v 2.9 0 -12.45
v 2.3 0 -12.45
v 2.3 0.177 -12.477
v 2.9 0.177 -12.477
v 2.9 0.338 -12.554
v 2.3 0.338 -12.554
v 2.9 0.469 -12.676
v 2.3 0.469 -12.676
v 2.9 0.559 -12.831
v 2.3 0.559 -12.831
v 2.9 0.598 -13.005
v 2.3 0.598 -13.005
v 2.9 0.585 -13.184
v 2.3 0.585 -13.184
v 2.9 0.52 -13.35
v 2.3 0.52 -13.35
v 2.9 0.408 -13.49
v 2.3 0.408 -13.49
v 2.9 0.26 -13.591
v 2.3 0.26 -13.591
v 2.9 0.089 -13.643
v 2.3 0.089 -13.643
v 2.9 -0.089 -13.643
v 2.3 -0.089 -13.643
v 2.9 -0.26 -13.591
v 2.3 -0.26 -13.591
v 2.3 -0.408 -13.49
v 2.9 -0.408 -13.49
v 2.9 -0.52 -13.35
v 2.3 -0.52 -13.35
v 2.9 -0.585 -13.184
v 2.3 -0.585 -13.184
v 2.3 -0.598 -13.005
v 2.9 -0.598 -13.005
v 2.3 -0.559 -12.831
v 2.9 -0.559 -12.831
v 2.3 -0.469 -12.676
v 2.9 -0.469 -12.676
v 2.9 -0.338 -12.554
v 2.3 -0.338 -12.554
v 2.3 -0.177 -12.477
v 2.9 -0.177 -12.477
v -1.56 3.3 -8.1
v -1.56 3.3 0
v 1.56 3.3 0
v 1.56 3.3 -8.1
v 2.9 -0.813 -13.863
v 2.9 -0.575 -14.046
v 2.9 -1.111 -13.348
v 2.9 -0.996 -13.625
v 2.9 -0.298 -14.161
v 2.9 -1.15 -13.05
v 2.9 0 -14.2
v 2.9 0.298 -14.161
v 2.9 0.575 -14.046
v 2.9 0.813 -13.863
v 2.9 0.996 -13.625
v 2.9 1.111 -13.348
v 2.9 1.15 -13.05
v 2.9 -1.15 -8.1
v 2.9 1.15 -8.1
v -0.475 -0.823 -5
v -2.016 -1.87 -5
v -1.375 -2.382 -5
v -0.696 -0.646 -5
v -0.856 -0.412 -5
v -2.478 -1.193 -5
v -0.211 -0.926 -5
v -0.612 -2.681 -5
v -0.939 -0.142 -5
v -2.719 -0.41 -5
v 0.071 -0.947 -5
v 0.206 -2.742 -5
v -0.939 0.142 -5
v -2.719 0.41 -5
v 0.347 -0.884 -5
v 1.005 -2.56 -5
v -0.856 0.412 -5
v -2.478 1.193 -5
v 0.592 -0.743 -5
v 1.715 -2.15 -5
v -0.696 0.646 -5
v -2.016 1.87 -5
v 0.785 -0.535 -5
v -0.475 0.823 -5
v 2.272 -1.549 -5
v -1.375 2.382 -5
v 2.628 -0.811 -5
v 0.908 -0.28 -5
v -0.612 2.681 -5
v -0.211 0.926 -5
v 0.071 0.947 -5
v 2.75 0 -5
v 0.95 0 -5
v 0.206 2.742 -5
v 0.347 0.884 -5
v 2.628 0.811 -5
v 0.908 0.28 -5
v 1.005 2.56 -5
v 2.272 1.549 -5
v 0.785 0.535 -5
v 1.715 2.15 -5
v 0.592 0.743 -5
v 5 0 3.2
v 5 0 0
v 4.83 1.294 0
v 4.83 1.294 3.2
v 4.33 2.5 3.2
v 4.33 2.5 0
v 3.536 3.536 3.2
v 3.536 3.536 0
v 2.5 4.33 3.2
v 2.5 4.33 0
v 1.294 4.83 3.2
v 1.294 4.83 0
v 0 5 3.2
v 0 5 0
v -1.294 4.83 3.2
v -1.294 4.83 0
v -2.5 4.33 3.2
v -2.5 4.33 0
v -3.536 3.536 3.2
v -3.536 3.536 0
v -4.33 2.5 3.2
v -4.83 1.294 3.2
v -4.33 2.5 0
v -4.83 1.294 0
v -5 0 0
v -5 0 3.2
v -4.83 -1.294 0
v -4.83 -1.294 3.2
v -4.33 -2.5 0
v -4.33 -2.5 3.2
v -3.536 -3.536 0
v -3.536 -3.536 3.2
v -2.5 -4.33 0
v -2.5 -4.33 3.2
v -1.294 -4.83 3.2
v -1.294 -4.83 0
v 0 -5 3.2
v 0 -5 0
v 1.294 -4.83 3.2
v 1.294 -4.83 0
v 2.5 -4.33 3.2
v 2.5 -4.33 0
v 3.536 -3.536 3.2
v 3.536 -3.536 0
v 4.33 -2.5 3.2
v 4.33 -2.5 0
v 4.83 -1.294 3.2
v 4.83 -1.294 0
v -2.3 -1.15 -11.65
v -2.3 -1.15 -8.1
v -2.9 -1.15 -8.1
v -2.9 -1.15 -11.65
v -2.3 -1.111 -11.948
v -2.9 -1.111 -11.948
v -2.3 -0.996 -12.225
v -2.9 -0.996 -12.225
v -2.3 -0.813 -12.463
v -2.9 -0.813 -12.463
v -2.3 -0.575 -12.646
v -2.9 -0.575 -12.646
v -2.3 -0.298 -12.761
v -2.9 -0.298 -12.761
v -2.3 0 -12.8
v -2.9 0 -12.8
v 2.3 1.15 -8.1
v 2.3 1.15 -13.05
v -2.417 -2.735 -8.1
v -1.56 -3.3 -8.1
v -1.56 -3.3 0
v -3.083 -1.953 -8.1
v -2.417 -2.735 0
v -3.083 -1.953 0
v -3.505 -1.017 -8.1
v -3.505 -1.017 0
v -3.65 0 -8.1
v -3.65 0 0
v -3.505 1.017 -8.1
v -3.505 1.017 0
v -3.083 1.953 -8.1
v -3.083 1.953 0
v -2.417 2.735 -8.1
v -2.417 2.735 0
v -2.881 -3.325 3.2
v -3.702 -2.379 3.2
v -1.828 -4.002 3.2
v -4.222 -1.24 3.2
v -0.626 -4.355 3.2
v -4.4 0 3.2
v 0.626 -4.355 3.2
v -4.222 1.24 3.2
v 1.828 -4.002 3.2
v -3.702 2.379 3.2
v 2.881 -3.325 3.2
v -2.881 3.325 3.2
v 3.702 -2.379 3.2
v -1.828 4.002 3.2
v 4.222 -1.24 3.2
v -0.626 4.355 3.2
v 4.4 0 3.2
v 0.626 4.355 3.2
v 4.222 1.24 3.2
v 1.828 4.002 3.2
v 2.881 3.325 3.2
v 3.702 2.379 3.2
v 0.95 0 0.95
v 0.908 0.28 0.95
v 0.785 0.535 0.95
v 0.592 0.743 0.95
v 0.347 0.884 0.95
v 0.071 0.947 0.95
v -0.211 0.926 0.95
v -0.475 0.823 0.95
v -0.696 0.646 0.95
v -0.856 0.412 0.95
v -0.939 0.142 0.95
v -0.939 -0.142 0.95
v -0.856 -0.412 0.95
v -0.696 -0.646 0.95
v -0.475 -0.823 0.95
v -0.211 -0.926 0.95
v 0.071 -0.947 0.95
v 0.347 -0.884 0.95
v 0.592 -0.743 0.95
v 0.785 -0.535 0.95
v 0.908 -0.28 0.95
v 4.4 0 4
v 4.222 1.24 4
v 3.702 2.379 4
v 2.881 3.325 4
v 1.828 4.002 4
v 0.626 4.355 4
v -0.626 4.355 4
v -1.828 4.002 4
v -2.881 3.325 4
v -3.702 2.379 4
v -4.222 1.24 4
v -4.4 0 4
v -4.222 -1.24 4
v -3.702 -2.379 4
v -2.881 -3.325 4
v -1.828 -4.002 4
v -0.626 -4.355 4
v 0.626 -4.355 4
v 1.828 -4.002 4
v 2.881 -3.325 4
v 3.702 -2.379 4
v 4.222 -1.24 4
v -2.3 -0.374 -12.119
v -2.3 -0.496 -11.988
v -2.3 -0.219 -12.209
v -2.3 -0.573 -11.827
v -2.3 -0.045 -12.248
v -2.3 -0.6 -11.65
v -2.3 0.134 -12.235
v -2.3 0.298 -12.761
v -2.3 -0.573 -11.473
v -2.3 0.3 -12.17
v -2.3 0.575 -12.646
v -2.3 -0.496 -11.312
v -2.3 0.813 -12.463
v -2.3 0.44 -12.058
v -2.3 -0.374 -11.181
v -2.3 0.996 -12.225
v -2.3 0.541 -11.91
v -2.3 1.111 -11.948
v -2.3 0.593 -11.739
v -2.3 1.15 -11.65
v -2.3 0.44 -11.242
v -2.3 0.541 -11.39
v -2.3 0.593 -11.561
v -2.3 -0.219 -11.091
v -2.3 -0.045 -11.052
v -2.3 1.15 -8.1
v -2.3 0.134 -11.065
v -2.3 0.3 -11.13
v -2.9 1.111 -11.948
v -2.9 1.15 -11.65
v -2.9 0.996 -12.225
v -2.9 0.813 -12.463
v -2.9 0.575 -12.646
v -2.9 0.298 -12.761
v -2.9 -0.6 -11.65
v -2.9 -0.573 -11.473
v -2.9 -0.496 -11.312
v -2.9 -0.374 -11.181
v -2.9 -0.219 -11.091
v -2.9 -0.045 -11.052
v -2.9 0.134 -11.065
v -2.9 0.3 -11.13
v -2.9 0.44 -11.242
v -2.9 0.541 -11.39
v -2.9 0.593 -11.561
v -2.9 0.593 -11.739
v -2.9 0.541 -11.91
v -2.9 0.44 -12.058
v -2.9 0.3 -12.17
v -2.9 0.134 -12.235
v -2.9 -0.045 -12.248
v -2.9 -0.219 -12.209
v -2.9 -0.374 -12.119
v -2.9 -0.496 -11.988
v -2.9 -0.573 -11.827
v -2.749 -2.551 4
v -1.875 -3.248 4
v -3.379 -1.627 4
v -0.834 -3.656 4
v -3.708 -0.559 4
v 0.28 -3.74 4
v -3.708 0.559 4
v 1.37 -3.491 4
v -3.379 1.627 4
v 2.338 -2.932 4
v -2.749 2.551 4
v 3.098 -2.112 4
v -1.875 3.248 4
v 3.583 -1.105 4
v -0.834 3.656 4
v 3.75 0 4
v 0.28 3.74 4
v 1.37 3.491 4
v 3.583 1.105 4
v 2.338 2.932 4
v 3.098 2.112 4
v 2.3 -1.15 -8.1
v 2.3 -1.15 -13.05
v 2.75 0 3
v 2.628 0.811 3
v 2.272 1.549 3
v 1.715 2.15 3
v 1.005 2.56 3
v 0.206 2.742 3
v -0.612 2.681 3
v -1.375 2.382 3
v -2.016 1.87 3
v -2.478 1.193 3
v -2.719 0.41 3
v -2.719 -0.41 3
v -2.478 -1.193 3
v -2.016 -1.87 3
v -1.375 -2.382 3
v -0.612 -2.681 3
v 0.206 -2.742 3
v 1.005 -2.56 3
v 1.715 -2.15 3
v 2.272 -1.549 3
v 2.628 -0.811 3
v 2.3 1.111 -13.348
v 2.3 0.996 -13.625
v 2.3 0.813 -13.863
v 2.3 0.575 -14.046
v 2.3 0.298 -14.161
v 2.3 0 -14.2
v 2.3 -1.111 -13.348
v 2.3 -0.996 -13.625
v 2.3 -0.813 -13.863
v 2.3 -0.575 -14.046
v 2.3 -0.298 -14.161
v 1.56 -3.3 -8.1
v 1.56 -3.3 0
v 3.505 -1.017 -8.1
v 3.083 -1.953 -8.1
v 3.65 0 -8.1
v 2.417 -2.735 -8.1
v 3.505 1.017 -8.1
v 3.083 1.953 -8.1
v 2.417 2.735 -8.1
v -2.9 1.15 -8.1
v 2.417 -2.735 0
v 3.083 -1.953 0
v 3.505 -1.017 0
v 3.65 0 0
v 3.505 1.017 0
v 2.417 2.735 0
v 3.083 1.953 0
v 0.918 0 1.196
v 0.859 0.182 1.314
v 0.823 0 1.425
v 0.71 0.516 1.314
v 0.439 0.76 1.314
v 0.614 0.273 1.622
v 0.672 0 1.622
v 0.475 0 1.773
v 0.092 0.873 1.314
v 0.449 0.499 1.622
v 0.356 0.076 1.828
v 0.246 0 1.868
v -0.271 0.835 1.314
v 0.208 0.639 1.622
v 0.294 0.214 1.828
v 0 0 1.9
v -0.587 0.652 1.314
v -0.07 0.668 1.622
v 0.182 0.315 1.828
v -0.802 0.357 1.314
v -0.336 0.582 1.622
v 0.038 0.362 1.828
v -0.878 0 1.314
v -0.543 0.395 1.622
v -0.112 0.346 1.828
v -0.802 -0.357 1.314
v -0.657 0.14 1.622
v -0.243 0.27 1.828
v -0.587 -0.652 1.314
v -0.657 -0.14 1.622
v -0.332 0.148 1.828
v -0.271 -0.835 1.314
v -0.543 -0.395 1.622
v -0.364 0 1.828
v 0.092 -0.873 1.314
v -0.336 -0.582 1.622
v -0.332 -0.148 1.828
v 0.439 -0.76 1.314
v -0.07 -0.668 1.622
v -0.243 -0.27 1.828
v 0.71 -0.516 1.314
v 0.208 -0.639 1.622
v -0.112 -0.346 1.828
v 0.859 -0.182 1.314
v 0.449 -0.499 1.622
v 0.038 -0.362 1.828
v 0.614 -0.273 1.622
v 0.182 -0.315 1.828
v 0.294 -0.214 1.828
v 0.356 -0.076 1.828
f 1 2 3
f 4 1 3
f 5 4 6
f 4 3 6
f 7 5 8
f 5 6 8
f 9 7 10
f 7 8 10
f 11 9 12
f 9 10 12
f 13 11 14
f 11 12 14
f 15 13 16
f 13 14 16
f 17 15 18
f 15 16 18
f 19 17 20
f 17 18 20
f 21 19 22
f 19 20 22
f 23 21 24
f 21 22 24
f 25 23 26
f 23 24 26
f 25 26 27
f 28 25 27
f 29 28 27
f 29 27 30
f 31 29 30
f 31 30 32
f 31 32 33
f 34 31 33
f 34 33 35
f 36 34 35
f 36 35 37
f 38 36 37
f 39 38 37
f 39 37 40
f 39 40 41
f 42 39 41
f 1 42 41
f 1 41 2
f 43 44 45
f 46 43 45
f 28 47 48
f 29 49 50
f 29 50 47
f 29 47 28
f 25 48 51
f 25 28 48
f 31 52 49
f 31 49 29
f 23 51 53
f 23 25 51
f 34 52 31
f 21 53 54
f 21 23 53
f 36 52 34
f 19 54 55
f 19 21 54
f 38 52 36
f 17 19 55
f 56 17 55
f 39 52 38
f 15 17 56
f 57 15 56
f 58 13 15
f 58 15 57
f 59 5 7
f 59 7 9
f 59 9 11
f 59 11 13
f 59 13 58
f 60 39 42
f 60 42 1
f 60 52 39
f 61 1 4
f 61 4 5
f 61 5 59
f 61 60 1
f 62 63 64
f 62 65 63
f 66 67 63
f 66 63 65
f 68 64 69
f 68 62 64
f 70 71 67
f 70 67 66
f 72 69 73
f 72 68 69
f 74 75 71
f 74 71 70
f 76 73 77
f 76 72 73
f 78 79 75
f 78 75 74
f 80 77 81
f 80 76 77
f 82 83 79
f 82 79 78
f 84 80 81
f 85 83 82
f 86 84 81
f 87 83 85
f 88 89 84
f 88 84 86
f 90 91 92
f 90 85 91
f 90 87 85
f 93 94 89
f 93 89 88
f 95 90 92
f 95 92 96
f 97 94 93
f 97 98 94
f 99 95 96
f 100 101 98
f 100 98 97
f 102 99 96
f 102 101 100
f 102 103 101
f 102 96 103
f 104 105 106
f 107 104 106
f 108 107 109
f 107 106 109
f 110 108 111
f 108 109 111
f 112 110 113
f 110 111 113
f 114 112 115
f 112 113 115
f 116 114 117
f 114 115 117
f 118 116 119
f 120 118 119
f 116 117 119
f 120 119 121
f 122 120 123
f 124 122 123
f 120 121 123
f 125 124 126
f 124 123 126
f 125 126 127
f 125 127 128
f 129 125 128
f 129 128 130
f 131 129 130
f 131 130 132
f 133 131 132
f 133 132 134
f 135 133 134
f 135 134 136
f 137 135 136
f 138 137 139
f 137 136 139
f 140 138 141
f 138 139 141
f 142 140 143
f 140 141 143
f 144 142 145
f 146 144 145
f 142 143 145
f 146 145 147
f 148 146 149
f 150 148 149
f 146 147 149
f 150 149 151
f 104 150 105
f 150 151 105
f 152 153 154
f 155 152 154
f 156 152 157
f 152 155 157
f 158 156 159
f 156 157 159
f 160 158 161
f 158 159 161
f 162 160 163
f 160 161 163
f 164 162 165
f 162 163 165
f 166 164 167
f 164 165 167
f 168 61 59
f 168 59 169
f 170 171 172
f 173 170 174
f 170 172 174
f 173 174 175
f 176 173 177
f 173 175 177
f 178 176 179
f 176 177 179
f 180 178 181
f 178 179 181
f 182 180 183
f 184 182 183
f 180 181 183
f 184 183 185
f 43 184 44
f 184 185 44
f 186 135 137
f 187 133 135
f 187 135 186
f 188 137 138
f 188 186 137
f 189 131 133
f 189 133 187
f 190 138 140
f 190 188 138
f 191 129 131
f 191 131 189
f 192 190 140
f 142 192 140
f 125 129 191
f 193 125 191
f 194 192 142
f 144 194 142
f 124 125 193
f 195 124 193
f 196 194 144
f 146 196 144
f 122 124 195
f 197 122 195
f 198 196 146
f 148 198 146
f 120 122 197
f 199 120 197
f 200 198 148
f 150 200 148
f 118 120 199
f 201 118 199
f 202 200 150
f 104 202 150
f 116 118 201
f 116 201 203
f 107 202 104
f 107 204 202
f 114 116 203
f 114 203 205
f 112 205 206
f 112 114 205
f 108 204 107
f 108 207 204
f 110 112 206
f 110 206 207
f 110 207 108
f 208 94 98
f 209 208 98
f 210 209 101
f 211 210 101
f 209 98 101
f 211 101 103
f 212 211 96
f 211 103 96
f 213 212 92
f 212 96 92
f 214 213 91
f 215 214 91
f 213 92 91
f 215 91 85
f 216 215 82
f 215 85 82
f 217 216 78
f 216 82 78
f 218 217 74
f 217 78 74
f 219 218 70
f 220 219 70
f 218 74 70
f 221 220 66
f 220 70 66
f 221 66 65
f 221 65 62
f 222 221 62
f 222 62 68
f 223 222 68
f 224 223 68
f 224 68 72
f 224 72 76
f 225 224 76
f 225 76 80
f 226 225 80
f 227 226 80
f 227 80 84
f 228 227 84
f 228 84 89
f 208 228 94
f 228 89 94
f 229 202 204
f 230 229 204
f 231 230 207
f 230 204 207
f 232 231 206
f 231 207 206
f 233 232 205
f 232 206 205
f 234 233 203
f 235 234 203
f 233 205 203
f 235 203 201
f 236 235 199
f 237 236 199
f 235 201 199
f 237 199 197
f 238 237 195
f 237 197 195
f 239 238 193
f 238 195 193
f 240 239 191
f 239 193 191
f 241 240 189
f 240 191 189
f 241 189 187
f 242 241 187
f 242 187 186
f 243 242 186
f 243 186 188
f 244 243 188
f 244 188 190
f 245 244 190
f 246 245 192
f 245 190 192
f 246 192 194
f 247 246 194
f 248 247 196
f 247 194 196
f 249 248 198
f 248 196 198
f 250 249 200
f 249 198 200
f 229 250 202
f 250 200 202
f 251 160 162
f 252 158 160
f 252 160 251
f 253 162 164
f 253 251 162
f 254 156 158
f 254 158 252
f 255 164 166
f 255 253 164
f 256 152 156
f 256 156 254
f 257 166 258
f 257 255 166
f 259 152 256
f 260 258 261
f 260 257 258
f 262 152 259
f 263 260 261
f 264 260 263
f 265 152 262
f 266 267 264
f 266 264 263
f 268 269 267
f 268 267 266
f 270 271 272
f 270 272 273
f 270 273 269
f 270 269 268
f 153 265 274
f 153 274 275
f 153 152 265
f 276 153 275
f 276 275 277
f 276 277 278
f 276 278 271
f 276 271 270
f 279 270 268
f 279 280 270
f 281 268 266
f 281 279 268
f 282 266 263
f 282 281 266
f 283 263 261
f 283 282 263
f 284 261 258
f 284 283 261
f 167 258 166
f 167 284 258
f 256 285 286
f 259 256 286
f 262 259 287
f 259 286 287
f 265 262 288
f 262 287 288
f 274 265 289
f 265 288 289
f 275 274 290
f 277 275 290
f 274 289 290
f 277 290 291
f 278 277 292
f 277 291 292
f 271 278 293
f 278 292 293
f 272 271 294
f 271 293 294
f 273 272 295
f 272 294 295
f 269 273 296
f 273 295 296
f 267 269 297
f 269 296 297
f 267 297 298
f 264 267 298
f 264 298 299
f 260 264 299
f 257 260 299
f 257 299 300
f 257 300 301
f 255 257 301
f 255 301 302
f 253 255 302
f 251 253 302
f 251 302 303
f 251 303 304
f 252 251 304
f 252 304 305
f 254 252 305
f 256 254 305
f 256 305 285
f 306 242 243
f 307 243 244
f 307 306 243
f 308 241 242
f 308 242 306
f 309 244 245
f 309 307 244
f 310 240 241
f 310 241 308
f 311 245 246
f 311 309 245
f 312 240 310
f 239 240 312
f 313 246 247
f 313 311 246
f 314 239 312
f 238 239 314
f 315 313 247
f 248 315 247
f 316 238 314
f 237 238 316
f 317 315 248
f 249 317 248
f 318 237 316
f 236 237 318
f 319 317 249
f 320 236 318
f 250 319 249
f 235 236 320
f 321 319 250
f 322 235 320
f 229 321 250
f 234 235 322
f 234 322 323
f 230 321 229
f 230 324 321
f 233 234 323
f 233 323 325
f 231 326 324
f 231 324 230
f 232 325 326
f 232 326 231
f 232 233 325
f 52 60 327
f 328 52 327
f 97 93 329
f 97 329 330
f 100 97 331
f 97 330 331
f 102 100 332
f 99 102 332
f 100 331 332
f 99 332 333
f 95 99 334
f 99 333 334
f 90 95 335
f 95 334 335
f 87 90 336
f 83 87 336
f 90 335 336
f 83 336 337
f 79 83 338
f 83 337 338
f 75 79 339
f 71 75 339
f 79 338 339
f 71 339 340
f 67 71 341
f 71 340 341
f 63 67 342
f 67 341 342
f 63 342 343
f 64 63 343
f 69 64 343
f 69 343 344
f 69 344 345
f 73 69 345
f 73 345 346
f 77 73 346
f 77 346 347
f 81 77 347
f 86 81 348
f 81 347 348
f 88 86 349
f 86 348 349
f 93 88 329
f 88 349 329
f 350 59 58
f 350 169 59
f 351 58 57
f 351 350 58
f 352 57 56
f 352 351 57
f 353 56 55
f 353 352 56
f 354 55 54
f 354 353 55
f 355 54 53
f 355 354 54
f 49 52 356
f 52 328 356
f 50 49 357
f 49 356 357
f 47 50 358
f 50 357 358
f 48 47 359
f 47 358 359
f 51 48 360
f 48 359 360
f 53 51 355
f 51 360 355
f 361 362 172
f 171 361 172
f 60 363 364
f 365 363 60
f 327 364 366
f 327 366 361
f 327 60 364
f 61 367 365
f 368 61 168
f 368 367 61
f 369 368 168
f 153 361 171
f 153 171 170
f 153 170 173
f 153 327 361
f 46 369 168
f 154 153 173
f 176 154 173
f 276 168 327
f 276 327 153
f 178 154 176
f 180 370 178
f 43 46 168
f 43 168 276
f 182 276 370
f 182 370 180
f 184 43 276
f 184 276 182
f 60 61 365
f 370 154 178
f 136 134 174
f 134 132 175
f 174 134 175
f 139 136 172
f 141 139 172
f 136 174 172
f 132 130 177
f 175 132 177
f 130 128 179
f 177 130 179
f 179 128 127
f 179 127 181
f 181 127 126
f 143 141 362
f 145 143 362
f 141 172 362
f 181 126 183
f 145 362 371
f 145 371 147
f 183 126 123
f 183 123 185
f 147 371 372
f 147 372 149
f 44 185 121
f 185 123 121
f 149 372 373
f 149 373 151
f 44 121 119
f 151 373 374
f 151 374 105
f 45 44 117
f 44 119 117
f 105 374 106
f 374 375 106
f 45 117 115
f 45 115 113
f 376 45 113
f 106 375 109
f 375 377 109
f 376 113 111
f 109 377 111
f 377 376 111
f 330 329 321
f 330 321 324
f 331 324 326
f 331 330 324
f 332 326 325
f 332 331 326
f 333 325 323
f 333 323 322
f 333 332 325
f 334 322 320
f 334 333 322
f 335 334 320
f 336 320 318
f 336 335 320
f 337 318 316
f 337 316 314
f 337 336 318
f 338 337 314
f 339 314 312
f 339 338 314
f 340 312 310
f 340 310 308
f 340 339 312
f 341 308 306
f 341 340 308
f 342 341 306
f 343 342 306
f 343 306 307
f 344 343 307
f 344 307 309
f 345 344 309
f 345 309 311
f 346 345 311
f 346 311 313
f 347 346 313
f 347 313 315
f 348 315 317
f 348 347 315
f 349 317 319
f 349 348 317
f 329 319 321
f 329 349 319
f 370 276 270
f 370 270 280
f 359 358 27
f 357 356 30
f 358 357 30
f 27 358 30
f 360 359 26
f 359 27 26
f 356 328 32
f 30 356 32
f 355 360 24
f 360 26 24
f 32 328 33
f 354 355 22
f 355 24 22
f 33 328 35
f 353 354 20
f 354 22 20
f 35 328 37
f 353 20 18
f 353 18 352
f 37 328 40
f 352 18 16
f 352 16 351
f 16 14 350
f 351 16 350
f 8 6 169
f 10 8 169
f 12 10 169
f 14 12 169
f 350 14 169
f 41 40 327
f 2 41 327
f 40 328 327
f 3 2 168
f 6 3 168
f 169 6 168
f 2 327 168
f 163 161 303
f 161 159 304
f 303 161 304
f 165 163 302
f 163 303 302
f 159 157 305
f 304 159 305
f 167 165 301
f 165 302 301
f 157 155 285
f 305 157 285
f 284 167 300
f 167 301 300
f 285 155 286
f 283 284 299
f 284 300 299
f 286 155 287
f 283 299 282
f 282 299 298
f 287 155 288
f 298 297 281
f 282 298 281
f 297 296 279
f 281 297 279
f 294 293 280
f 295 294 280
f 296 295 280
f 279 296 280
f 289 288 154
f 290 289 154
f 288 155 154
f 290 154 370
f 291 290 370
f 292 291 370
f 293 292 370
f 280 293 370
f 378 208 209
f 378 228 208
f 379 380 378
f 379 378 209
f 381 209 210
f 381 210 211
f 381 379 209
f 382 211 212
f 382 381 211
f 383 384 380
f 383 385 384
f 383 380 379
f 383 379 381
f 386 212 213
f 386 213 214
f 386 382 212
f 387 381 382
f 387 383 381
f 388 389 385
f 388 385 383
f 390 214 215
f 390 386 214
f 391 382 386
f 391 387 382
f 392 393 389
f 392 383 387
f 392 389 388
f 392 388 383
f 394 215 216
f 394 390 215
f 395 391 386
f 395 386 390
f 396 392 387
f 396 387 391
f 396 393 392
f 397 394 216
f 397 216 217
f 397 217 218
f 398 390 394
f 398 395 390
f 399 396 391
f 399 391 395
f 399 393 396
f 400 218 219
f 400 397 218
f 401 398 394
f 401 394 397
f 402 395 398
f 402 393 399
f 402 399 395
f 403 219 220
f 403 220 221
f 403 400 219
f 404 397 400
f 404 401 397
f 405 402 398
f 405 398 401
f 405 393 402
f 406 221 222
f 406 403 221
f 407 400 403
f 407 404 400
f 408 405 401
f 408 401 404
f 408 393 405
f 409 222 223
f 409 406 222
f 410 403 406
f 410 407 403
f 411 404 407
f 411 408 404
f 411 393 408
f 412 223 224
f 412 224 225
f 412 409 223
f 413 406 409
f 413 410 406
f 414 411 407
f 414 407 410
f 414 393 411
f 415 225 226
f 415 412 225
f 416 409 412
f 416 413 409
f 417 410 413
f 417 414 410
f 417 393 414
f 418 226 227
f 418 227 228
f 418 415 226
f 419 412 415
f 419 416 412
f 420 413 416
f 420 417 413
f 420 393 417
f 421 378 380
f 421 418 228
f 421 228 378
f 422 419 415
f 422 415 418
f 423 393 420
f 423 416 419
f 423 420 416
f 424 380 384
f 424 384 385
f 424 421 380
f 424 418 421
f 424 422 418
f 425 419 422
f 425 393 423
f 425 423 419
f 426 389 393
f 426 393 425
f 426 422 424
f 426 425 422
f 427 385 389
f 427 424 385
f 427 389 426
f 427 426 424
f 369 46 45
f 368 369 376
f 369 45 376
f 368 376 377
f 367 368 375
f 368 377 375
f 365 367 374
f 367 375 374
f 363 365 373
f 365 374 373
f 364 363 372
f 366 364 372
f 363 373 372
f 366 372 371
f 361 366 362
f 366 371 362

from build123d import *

# Parameters (mm, degrees)
ESQUISSE1_R             = 5
BOSS_EXTRU_1_DEPTH      = 3.2
BOSS_EXTRU_2_START      = 3.2
ESQUISSE1_3_R           = 4.4
BOSS_EXTRU_2_DEPTH      = 0.8
BOSS_EXTRU_3_DEPTH      = 8.1
ENL_V_START             = 4
ESQUISSE1_5_R           = 2.75
ENL_V_MAT_EXTRU_1_DEPTH = 9
BOSS_EXTRU_4_START      = -5
ESQUISSE1_6_R           = 0.95
BOSS_EXTRU_4_DEPTH      = 6.9
CHANFREIN1_SIZE         = 1
CONG_1_R                = 0.95
ESQUISSE2_W             = 0.6
ESQUISSE2_H             = 2.3
BOSS_EXTRU_5_DEPTH      = 6.1
ESQUISSE2_3_W           = 0.6
ESQUISSE2_3_H           = 2.3
BOSS_EXTRU_6_DEPTH      = 4.7
CONG_2_R                = 1.15
ENL_V_MAT_EXTRU_2_REACH = 18.731
ESQUISSE3_R             = 0.6
ENL_V_MAT_EXTRU_3_REACH = 19.001
ESQUISSE4_R             = 0.6


with BuildPart() as part:
    # Esquisse1 → Boss.-Extru.1 (new body)
    with BuildSketch(Plane.XY):
        Circle(ESQUISSE1_R)
    extrude(amount=BOSS_EXTRU_1_DEPTH)

    # Esquisse1<3> → Boss.-Extru.2 (add)
    with BuildSketch(Plane.XY.offset(BOSS_EXTRU_2_START)):
        Circle(ESQUISSE1_3_R)
    extrude(amount=BOSS_EXTRU_2_DEPTH)

    # Esquisse1<4> → Boss.-Extru.3 (add)
    with BuildSketch(Plane.XY):
        with BuildLine():
            Line((-1.559647396, 3.3), (1.559647396, 3.3))
            ThreePointArc((1.559647396, 3.3), (3.65, 0), (1.559647396, -3.3))
            Line((1.559647396, -3.3), (-1.559647396, -3.3))
            ThreePointArc((-1.559647396, -3.3), (-3.65, 0), (-1.559647396, 3.3))
        make_face()
    extrude(amount=-BOSS_EXTRU_3_DEPTH)

    # Esquisse1<5> → Enlèv. mat.-Extru.1 (cut)
    with BuildSketch(Plane.XY.offset(ENL_V_START)):
        Circle(ESQUISSE1_5_R)
    extrude(amount=-ENL_V_MAT_EXTRU_1_DEPTH, mode=Mode.SUBTRACT)

    # Esquisse1<6> → Boss.-Extru.4 (add)
    with BuildSketch(Plane.XY.offset(BOSS_EXTRU_4_START)):
        Circle(ESQUISSE1_6_R)
    extrude(amount=BOSS_EXTRU_4_DEPTH)

    # Chanfrein1
    chanfrein1_edges = [part.edges().sort_by_distance(p)[0] for p in [
        (-2.75, 0, 4),
    ]]
    chamfer(chanfrein1_edges, length=CHANFREIN1_SIZE)

    # Congé1
    cong_1_edges = [part.edges().sort_by_distance(p)[0] for p in [
        (-0.95, 0, 1.9),
    ]]
    fillet(cong_1_edges, radius=CONG_1_R)

    # Esquisse2 → Boss.-Extru.5 (add)
    with BuildSketch(Plane(origin=(0, 0, -8.1), x_dir=(-1, 0, 0), z_dir=(0, 0, -1))):
        with Locations((-2.6, 0)):
            Rectangle(ESQUISSE2_W, ESQUISSE2_H)
    extrude(amount=BOSS_EXTRU_5_DEPTH)

    # Esquisse2<3> → Boss.-Extru.6 (add)
    with BuildSketch(Plane(origin=(0, 0, -8.1), x_dir=(-1, 0, 0), z_dir=(0, 0, -1))):
        with Locations((2.6, 0)):
            Rectangle(ESQUISSE2_3_W, ESQUISSE2_3_H)
    extrude(amount=BOSS_EXTRU_6_DEPTH)

    # Congé2
    cong_2_edges = [part.edges().sort_by_distance(p)[0] for p in [
        (-2.6, -1.15, -12.8),
        (-2.6, 1.15, -12.8),
        (2.6, -1.15, -14.2),
        (2.6, 1.15, -14.2),
    ]]
    fillet(cong_2_edges, radius=CONG_2_R - 0.0001)  # a hair under: the kernel refuses the full size

    # Esquisse3 → Enlèv. mat.-Extru.2 (cut, up to next)
    with BuildSketch(Plane.ZY.offset(-2.3), mode=Mode.PRIVATE) as enl_v_mat_extru_2_sk1:
        with Locations((-13.05, 0)):
            Circle(ESQUISSE3_R)
    enl_v_mat_extru_2_tool1 = extrude(enl_v_mat_extru_2_sk1.sketch, amount=-ENL_V_MAT_EXTRU_2_REACH, mode=Mode.PRIVATE) & part.part
    add(enl_v_mat_extru_2_tool1.solids().sort_by_distance((2.3, 0, -13.05))[0], mode=Mode.SUBTRACT)

    # Esquisse4 → Enlèv. mat.-Extru.3 (cut, up to next)
    with BuildSketch(Plane.ZY.offset(2.9), mode=Mode.PRIVATE) as enl_v_mat_extru_3_sk1:
        with Locations(Location((-11.65, 0, 0), (0, 0, 270))):
            Circle(ESQUISSE4_R)
    enl_v_mat_extru_3_tool1 = extrude(enl_v_mat_extru_3_sk1.sketch, amount=-ENL_V_MAT_EXTRU_3_REACH, mode=Mode.PRIVATE) & part.part
    add(enl_v_mat_extru_3_tool1.solids().sort_by_distance((-2.9, 0, -11.65))[0], mode=Mode.SUBTRACT)


solid = part.part
